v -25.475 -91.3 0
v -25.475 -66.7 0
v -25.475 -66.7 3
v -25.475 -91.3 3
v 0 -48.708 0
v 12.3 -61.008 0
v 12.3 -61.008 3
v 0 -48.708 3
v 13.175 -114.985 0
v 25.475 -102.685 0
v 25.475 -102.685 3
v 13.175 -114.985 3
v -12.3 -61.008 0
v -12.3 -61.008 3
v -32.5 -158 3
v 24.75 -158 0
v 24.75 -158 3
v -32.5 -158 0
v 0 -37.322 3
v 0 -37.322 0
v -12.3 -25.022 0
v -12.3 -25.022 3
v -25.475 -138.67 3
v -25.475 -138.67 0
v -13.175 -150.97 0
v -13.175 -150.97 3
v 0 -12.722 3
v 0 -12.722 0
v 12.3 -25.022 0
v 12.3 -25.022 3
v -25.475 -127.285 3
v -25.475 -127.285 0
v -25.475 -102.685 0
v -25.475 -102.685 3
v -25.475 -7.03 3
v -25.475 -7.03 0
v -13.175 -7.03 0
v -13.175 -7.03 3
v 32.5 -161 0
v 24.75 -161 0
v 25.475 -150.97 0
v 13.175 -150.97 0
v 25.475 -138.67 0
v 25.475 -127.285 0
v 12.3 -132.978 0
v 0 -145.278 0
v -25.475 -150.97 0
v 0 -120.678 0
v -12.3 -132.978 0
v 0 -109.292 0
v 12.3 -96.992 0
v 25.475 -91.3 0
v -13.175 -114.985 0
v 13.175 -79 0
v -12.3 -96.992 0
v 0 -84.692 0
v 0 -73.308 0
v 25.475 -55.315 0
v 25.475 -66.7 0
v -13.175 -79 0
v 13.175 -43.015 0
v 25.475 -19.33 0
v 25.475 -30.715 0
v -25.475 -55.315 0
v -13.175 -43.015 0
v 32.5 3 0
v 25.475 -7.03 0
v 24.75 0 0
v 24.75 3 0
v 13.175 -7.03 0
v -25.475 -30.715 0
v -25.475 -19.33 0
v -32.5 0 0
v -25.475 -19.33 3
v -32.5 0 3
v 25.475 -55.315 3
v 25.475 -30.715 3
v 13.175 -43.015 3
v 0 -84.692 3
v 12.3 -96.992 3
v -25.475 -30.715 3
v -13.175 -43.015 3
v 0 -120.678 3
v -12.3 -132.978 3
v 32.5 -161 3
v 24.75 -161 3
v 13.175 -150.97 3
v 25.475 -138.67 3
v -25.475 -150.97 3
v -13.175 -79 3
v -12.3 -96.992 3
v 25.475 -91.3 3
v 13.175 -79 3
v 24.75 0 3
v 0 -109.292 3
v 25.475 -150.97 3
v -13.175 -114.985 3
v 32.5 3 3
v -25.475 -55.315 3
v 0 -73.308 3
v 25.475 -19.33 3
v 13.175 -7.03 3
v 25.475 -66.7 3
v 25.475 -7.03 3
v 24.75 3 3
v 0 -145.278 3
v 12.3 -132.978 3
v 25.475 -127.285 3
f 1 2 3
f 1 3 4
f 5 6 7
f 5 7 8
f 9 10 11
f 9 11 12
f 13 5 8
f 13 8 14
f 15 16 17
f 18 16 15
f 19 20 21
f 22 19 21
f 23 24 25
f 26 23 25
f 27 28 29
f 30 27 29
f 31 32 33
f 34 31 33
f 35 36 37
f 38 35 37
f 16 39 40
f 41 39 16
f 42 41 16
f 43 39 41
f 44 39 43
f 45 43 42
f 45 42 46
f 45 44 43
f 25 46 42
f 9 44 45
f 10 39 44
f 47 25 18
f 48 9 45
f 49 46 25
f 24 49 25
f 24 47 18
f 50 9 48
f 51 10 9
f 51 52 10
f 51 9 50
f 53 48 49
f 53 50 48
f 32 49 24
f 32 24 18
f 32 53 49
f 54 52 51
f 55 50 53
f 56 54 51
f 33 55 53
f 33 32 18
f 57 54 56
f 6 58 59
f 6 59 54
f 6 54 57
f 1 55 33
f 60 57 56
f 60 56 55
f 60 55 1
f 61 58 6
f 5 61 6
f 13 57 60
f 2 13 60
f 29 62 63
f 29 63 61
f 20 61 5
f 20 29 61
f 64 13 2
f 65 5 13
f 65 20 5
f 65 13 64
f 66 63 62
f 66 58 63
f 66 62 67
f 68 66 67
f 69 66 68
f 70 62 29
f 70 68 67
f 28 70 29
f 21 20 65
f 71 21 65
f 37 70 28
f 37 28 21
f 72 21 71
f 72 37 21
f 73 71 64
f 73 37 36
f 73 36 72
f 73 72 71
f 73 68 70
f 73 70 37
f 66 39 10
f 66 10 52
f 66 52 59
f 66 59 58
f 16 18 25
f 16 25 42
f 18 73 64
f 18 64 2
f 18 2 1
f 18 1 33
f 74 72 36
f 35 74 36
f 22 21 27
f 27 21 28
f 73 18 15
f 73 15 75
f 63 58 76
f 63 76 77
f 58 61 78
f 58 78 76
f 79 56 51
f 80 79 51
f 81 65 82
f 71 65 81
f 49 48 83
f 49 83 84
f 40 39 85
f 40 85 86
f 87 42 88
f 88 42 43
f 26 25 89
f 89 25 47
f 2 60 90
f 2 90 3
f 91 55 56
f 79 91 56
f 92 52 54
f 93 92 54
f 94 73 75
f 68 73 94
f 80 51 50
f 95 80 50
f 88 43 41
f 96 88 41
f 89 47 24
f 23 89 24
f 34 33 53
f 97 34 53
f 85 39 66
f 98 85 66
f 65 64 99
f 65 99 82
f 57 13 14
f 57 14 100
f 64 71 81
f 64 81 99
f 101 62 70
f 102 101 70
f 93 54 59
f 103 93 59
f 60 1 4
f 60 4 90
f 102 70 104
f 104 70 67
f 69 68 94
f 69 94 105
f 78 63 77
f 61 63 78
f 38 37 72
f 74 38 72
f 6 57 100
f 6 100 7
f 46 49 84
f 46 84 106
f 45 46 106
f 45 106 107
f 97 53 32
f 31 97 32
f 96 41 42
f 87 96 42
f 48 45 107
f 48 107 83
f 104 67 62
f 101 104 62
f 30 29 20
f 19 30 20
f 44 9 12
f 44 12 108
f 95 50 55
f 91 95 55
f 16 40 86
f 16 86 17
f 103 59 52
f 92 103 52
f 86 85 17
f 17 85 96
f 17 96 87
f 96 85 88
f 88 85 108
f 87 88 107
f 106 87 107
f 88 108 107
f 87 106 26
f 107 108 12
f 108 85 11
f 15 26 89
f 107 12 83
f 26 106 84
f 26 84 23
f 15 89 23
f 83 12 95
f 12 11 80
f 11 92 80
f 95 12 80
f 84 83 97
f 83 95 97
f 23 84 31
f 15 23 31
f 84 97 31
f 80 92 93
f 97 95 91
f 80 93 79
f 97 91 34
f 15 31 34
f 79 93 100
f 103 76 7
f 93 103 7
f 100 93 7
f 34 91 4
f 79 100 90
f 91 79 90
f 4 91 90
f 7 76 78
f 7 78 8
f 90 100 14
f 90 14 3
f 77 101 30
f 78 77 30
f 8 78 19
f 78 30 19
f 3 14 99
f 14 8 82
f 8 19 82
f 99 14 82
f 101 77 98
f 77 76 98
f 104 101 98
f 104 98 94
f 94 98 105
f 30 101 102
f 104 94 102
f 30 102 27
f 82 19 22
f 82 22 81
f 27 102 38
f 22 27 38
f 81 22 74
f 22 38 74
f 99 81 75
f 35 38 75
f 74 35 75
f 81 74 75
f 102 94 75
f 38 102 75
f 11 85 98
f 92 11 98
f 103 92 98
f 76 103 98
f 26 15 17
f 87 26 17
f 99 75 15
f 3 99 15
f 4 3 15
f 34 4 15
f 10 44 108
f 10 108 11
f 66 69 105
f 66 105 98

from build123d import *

# Parameters (mm, degrees)
SALIENTE_EXTRUIR1_DEPTH = 3


with BuildPart() as part:
    # Croquis1 → Saliente-Extruir1 (new body)
    with BuildSketch(Plane.XY):
        Polygon((-32.5, 0), (24.75, 0), (24.75, 3), (32.5, 3), (32.5, 0), (32.5, -158), (32.5, -161), (24.75, -161), (24.75, -158), (-32.5, -158), align=None)
        Polygon((-13.175, -7.03), (-25.475, -19.33), (-25.475, -7.03), align=None, mode=Mode.SUBTRACT)
        Polygon((13.175, -7.03), (25.475, -7.03), (25.475, -19.33), align=None, mode=Mode.SUBTRACT)
        Polygon((13.175, -79), (25.475, -66.7), (25.475, -91.3), align=None, mode=Mode.SUBTRACT)
        Polygon((13.175, -150.97), (25.475, -138.67), (25.475, -150.97), align=None, mode=Mode.SUBTRACT)
        Polygon((-13.175, -79), (-25.475, -66.7), (-25.475, -91.3), align=None, mode=Mode.SUBTRACT)
        Polygon((13.175, -43.015), (25.475, -55.315), (25.475, -30.715), align=None, mode=Mode.SUBTRACT)
        Polygon((-13.175, -43.015), (-25.475, -30.715), (-25.475, -55.315), align=None, mode=Mode.SUBTRACT)
        Polygon((0, -48.7075), (-12.3, -61.0075), (0, -73.3075), (12.3, -61.0075), align=None, mode=Mode.SUBTRACT)
        Polygon((0, -12.7225), (12.3, -25.0225), (0, -37.3225), (-12.3, -25.0225), align=None, mode=Mode.SUBTRACT)
        Polygon((-13.175, -150.97), (-25.475, -150.97), (-25.475, -138.67), align=None, mode=Mode.SUBTRACT)
        Polygon((-13.175, -114.985), (-25.475, -127.285), (-25.475, -102.685), align=None, mode=Mode.SUBTRACT)
        Polygon((-12.3, -132.9775), (0, -145.2775), (12.3, -132.9775), (0, -120.6775), align=None, mode=Mode.SUBTRACT)
        Polygon((13.175, -114.985), (25.475, -127.285), (25.475, -102.685), align=None, mode=Mode.SUBTRACT)
        Polygon((0, -84.6925), (12.3, -96.9925), (0, -109.2925), (-12.3, -96.9925), align=None, mode=Mode.SUBTRACT)
    extrude(amount=SALIENTE_EXTRUIR1_DEPTH)


solid = part.part
